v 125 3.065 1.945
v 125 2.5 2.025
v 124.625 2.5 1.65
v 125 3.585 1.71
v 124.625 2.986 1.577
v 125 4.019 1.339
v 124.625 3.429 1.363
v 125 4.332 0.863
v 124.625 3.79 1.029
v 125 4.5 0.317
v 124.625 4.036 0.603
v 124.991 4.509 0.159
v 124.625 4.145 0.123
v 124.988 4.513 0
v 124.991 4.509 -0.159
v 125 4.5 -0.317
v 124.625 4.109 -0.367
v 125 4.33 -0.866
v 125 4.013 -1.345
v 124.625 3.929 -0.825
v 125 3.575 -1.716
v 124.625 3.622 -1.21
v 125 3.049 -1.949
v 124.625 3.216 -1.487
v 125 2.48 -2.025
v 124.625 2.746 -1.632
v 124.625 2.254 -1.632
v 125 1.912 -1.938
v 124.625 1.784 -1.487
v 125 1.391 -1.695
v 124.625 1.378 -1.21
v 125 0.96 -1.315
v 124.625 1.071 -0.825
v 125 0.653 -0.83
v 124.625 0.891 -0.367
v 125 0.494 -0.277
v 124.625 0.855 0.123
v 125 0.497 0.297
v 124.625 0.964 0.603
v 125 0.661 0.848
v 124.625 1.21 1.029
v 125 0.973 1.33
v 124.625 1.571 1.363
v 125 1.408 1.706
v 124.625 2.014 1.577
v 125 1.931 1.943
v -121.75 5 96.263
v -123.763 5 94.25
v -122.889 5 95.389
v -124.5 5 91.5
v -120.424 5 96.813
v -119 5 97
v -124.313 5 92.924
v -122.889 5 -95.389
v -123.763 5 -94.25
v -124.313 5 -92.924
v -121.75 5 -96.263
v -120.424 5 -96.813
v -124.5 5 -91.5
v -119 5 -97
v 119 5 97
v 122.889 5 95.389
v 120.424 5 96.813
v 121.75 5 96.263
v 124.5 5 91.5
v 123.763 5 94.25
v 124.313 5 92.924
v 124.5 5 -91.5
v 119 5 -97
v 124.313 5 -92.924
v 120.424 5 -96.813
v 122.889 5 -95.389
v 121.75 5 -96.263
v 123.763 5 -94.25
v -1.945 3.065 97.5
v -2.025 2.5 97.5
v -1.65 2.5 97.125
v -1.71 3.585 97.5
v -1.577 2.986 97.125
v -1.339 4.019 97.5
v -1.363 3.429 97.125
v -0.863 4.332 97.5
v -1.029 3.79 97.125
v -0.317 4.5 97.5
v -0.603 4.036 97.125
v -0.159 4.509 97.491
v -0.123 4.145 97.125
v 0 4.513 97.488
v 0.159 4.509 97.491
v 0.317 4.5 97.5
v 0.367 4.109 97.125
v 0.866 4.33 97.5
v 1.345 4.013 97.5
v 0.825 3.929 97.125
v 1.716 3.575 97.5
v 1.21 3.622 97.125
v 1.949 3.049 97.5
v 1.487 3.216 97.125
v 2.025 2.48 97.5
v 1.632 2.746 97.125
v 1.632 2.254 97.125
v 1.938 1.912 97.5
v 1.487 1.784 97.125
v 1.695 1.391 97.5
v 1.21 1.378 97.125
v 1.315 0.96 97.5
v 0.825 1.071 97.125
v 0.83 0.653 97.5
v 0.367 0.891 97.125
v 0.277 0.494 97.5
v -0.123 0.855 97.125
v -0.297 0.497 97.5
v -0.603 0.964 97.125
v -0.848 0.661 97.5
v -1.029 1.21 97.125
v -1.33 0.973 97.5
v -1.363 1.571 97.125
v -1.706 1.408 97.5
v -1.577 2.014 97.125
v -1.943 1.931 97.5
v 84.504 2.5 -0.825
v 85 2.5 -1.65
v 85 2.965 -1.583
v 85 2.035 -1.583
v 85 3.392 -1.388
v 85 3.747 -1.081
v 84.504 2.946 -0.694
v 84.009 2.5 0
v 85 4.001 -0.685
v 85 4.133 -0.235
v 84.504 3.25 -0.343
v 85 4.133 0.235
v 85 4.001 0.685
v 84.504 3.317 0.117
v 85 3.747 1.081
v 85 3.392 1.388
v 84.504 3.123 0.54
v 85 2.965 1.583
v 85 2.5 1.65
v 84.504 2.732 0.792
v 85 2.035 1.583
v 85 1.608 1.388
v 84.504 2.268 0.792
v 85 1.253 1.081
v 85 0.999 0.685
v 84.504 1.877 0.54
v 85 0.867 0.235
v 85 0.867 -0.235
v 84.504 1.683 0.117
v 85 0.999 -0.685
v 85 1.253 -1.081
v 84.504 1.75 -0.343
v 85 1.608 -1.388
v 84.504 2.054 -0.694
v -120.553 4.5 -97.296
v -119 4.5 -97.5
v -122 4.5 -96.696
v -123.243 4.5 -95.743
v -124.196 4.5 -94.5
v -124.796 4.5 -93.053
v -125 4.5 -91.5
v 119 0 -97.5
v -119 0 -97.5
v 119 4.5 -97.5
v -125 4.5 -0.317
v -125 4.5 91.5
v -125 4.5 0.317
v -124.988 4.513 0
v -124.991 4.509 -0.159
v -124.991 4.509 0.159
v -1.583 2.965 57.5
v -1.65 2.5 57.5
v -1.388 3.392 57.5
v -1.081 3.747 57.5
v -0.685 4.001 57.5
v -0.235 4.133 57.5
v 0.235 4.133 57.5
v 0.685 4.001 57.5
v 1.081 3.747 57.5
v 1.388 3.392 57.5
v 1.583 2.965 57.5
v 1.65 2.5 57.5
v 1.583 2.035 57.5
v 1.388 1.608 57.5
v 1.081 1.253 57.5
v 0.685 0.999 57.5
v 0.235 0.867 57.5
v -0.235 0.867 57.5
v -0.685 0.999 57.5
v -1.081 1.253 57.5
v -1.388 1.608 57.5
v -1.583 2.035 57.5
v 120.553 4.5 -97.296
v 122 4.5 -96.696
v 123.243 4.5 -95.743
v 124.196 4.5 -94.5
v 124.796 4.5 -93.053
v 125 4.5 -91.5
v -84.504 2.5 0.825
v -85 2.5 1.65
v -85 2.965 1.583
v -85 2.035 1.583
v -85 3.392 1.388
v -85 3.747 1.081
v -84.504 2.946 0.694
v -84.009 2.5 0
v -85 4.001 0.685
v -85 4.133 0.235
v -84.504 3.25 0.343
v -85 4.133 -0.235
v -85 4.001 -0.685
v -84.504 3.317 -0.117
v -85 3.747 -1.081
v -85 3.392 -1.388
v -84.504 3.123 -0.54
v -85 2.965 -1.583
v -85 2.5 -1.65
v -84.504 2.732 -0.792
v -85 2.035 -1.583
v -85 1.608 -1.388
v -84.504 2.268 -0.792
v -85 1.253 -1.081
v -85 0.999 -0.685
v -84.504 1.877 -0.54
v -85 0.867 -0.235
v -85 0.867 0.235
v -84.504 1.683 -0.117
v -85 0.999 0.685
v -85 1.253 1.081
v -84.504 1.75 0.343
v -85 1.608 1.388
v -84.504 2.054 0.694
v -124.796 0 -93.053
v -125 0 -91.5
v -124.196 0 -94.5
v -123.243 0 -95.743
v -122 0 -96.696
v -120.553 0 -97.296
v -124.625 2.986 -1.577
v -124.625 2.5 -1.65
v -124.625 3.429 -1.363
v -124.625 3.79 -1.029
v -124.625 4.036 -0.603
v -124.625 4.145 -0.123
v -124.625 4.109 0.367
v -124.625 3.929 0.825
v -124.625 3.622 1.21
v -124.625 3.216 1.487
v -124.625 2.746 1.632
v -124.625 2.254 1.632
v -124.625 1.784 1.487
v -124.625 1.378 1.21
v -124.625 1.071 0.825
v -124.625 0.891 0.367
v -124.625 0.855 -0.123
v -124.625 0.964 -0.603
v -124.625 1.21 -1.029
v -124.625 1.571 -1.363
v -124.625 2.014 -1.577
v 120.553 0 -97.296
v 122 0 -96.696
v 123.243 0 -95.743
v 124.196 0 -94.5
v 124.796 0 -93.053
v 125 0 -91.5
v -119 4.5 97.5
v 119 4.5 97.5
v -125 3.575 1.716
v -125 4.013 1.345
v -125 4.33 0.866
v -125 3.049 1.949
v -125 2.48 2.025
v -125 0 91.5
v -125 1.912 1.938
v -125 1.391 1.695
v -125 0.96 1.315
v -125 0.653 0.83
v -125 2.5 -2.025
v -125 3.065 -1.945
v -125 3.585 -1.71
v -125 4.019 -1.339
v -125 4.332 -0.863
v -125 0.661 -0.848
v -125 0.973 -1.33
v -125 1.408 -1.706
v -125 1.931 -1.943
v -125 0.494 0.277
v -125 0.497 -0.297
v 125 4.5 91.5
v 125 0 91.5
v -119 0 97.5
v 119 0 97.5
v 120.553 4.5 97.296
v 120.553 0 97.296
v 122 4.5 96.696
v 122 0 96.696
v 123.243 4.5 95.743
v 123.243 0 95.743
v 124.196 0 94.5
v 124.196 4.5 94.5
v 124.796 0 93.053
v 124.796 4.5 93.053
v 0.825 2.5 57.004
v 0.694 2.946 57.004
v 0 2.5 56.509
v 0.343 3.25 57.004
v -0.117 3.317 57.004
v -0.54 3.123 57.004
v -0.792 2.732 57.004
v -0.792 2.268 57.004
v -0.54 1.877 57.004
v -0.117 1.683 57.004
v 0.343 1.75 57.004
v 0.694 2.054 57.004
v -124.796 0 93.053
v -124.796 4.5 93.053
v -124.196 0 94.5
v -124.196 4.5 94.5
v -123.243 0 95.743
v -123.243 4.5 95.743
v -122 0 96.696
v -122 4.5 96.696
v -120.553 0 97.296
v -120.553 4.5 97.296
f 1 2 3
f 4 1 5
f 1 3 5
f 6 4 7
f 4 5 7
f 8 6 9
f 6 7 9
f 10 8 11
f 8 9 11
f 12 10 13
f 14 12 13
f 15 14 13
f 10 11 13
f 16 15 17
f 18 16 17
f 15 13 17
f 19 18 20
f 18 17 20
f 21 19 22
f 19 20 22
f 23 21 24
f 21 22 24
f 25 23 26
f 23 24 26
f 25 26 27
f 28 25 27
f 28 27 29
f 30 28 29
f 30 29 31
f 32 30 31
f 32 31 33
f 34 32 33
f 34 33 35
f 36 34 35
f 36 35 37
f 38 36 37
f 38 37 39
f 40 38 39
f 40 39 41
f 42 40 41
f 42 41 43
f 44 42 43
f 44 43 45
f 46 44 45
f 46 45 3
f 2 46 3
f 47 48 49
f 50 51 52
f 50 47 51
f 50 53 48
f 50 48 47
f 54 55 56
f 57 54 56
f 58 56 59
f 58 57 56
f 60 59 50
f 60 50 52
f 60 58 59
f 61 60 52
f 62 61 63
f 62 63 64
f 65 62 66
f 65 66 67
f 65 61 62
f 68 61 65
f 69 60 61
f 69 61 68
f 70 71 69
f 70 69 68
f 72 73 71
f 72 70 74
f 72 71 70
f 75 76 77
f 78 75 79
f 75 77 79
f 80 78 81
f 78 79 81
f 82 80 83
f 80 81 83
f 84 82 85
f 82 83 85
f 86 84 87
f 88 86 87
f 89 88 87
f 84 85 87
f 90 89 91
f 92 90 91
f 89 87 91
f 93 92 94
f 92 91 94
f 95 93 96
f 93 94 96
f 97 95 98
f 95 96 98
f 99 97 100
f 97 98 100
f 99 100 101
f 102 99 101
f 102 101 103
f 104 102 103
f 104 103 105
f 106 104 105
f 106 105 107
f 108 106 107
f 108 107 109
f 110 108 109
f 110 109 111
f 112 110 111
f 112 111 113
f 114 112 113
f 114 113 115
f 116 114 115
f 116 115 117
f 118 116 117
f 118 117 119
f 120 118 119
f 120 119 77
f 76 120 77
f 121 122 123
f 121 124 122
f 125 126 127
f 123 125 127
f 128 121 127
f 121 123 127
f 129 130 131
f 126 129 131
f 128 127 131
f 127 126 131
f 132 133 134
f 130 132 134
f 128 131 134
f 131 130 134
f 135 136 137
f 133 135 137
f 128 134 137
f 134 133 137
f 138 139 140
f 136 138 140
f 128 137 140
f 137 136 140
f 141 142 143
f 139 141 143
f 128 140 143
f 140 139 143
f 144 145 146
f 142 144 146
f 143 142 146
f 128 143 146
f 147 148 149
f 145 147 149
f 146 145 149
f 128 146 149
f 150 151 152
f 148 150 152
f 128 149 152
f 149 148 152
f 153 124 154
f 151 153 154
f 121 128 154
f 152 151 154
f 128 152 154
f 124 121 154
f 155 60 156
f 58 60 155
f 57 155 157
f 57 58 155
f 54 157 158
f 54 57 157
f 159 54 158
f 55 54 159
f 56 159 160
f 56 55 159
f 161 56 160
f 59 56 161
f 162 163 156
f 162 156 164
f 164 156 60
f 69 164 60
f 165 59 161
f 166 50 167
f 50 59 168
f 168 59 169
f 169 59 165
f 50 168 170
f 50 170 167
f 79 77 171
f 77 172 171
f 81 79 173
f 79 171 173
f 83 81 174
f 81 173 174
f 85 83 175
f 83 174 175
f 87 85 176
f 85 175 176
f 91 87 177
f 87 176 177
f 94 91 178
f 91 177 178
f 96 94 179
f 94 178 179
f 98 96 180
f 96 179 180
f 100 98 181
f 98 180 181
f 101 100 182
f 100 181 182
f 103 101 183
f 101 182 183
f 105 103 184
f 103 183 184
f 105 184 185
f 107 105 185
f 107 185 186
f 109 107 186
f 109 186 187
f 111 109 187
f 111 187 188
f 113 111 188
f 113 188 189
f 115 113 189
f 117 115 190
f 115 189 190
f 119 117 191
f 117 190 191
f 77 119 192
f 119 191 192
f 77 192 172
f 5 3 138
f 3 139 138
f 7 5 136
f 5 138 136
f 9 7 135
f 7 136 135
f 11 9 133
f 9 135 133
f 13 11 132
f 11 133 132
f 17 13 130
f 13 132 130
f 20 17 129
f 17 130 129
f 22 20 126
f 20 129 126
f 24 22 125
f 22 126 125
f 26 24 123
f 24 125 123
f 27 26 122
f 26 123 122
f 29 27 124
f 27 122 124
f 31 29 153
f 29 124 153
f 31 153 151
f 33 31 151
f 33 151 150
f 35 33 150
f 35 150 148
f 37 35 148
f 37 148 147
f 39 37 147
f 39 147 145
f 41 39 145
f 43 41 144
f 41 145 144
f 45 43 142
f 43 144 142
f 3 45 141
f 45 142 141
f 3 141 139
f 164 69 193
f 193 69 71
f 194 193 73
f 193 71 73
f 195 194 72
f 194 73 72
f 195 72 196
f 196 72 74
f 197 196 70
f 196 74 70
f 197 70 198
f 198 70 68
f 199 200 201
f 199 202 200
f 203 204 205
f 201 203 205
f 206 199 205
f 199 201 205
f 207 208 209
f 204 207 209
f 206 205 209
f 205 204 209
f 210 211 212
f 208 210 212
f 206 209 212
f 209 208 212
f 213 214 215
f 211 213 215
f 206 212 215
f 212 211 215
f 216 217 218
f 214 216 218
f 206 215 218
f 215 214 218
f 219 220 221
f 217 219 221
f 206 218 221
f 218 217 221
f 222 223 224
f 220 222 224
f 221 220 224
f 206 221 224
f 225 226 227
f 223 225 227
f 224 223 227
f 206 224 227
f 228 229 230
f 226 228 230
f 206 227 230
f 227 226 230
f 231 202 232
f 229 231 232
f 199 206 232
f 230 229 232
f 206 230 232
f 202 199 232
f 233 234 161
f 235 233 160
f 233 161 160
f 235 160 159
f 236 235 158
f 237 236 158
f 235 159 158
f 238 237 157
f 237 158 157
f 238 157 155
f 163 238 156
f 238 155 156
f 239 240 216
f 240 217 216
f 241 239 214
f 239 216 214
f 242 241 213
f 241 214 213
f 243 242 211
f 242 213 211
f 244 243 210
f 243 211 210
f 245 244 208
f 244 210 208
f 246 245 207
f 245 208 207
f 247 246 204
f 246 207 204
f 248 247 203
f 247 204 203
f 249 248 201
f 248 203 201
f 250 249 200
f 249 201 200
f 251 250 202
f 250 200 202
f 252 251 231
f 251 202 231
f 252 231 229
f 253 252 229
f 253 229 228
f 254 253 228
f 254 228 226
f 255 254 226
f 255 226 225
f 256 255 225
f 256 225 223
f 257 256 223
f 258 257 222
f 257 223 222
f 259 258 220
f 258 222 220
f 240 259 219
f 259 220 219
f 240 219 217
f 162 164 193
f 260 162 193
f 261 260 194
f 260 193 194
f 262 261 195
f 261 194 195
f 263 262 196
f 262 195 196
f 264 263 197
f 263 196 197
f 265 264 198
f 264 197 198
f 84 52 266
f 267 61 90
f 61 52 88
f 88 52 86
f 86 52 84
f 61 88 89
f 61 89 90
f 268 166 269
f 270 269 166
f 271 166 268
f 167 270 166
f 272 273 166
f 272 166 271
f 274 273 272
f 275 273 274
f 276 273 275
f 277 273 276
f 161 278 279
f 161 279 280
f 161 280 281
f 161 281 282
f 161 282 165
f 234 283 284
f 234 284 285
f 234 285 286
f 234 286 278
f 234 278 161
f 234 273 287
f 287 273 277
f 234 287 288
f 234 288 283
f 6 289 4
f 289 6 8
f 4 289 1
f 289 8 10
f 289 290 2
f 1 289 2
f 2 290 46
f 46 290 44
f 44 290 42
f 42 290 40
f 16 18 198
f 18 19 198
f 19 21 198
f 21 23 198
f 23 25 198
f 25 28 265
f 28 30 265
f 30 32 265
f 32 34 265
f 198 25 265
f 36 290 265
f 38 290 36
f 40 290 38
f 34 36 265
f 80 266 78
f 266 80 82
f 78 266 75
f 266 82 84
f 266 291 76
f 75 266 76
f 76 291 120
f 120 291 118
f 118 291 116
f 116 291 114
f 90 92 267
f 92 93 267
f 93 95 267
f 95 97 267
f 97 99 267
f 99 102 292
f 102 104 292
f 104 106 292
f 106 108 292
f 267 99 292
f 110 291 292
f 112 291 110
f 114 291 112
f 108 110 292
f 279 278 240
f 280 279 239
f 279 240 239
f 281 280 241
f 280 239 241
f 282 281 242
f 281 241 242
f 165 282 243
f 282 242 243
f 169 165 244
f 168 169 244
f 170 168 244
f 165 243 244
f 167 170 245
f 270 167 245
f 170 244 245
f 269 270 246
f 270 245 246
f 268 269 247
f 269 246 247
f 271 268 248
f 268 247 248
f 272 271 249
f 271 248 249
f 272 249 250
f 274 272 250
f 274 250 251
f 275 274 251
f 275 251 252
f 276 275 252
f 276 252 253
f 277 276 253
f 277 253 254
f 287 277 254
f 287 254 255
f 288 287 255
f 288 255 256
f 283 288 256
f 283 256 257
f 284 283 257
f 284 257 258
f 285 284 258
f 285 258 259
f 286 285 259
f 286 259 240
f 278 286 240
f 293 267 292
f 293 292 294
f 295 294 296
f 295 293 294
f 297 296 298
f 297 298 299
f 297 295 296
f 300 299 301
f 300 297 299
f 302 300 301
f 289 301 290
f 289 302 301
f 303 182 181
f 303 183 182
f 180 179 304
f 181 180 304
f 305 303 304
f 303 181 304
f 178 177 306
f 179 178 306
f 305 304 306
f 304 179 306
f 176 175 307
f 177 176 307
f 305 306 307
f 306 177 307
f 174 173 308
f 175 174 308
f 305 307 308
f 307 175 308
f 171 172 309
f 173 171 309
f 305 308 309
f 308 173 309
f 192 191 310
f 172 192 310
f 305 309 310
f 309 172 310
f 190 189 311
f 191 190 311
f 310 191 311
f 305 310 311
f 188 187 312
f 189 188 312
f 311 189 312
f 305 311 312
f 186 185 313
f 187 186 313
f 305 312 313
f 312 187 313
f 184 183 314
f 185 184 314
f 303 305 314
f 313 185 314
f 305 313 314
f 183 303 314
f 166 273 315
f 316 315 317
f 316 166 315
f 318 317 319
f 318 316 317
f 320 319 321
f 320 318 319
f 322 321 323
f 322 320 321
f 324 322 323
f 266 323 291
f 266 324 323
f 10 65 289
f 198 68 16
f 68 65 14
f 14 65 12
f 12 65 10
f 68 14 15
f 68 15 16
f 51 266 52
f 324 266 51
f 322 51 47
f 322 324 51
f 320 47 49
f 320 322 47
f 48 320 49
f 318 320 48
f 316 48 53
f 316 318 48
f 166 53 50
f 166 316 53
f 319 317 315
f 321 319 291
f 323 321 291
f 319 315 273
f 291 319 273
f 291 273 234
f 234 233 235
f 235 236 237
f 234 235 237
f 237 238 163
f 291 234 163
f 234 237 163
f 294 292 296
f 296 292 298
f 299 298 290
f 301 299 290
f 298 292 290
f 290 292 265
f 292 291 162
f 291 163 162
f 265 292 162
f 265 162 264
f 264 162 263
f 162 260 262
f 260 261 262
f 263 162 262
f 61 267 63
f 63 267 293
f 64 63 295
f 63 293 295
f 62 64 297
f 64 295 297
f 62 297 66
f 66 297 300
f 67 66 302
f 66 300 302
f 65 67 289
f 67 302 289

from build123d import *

# Parameters (mm, degrees)
SKETCH_1_W                   = 250
SKETCH_1_H                   = 195
EXTRUDE_377_DEPTH            = 5
HOLE_WIZARD_1_M4_D           = 3.3
HOLE_WIZARD_1_M4_DEPTH       = 40
HOLE_WIZARD_1_M4_CSINK_D     = 4.05
HOLE_WIZARD_1_M4_CSINK_ANGLE = 90
HOLE_WIZARD_1_M4_TIP         = 0.991420021
HOLE_WIZARD_2_M4_D           = 3.3
HOLE_WIZARD_2_M4_DEPTH       = 40
HOLE_WIZARD_2_M4_CSINK_D     = 4.05
HOLE_WIZARD_2_M4_CSINK_ANGLE = 90
HOLE_WIZARD_2_M4_TIP         = 0.991420021
HOLE_WIZARD_3_M4_D           = 3.3
HOLE_WIZARD_3_M4_DEPTH       = 40
HOLE_WIZARD_3_M4_CSINK_D     = 4.05
HOLE_WIZARD_3_M4_CSINK_ANGLE = 90
HOLE_WIZARD_3_M4_TIP         = 0.991420021
FILLET_1_R                   = 6
CHAMFER_1_SIZE               = 0.5


with BuildPart() as part:
    # Эскиз1 → Extrude 377 (new body)
    with BuildSketch(Plane(origin=(0, 0, 0), x_dir=(1, 0, 0), z_dir=(0, 1, 0))):
        Rectangle(SKETCH_1_W, SKETCH_1_H)
    extrude(amount=EXTRUDE_377_DEPTH)

    # Резьба-1-M4
    with Locations(Plane(origin=(125, 0, 0), x_dir=(0, 0, -1), z_dir=(1, 0, 0))):
        with Locations((0, 2.5)):
            CounterSinkHole(HOLE_WIZARD_1_M4_D / 2, HOLE_WIZARD_1_M4_CSINK_D / 2, depth=HOLE_WIZARD_1_M4_DEPTH, counter_sink_angle=HOLE_WIZARD_1_M4_CSINK_ANGLE)
            with Locations((0, 0, -(HOLE_WIZARD_1_M4_DEPTH + HOLE_WIZARD_1_M4_TIP / 2))):  # 118° drill point
                Cone(0, HOLE_WIZARD_1_M4_D / 2, HOLE_WIZARD_1_M4_TIP, mode=Mode.SUBTRACT)

    # Резьба-2-M4
    with Locations(Plane.ZY.offset(125)):
        with Locations((0, 2.5)):
            CounterSinkHole(HOLE_WIZARD_2_M4_D / 2, HOLE_WIZARD_2_M4_CSINK_D / 2, depth=HOLE_WIZARD_2_M4_DEPTH, counter_sink_angle=HOLE_WIZARD_2_M4_CSINK_ANGLE)
            with Locations((0, 0, -(HOLE_WIZARD_2_M4_DEPTH + HOLE_WIZARD_2_M4_TIP / 2))):  # 118° drill point
                Cone(0, HOLE_WIZARD_2_M4_D / 2, HOLE_WIZARD_2_M4_TIP, mode=Mode.SUBTRACT)

    # Резьба-3-M4
    with Locations(Plane.XY.offset(97.5)):
        with Locations((0, 2.5)):
            CounterSinkHole(HOLE_WIZARD_3_M4_D / 2, HOLE_WIZARD_3_M4_CSINK_D / 2, depth=HOLE_WIZARD_3_M4_DEPTH, counter_sink_angle=HOLE_WIZARD_3_M4_CSINK_ANGLE)
            with Locations((0, 0, -(HOLE_WIZARD_3_M4_DEPTH + HOLE_WIZARD_3_M4_TIP / 2))):  # 118° drill point
                Cone(0, HOLE_WIZARD_3_M4_D / 2, HOLE_WIZARD_3_M4_TIP, mode=Mode.SUBTRACT)

    # Скругление1
    fillet_1_edges = [part.edges().sort_by_distance(p)[0] for p in [
        (125, 2.5, 97.5),
        (-125, 2.5, 97.5),
        (-125, 2.5, -97.5),
        (125, 2.5, -97.5),
    ]]
    fillet(fillet_1_edges, radius=FILLET_1_R)

    # Фаска1
    # the kernel refuses this chamfer: 0.5 mm, written as the material it takes off along each edge
    with BuildSketch(Plane(origin=(-119, 5, -97.5), x_dir=(0, -0.999621916911297, -0.0274958766105822), z_dir=(1, 0, 0))) as chamfer_1_piece_1:
        Polygon((CHAMFER_1_SIZE * 0.999621916911, -CHAMFER_1_SIZE * 0.0274958766106), (-CHAMFER_1_SIZE * 0.0274958766106, -CHAMFER_1_SIZE * 0.999621916911), (0, 0), align=None)
    extrude(amount=238, mode=Mode.SUBTRACT)
    with BuildSketch(Plane(origin=(125, 5, -91.5), x_dir=(-0.9996219169112968, 0.02749587661058574, 0), z_dir=(0, 0, 1)), Plane(origin=(-125, 5, 91.5), x_dir=(0.9996219169112968, 0.02749587661058574, 0), z_dir=(0, 0, -1))) as chamfer_1_piece_2:
        Polygon((CHAMFER_1_SIZE * 0.999621916911, CHAMFER_1_SIZE * 0.0274958766106), (-CHAMFER_1_SIZE * 0.0274958766106, CHAMFER_1_SIZE * 0.999621916911), (0, 0), align=None)
    extrude(amount=183, mode=Mode.SUBTRACT)
    with BuildSketch(Plane(origin=(119, 5, 97.5), x_dir=(0, 0.02749587661058574, -0.9996219169112968), z_dir=(-1, 0, 0))) as chamfer_1_piece_3:
        Polygon((CHAMFER_1_SIZE * 0.999621916911, CHAMFER_1_SIZE * 0.0274958766106), (-CHAMFER_1_SIZE * 0.0274958766106, CHAMFER_1_SIZE * 0.999621916911), (0, 0), align=None)
    extrude(amount=238, mode=Mode.SUBTRACT)
    with BuildSketch(Plane(origin=(-119, 5, 91.5), x_dir=(0, 0, 1), z_dir=(1, 0, 0))) as chamfer_1_piece_4:
        Polygon((6 - CHAMFER_1_SIZE, 0), (6, CHAMFER_1_SIZE), (6, 0), align=None)
    revolve(axis=Axis((-119, 5, 91.5), (0, -1, 0)), revolution_arc=90, mode=Mode.SUBTRACT)
    with BuildSketch(Plane(origin=(119, 5, 91.5), x_dir=(0, 0, 1), z_dir=(-1, 0, 0))) as chamfer_1_piece_5:
        Polygon((6 - CHAMFER_1_SIZE, 0), (6, -CHAMFER_1_SIZE), (6, 0), align=None)
    revolve(axis=Axis((119, 5, 91.5), (0, 1, 0)), revolution_arc=90, mode=Mode.SUBTRACT)
    with BuildSketch(Plane(origin=(-119, 5, -91.5), x_dir=(0, 0, -1), z_dir=(1, 0, 0))) as chamfer_1_piece_6:
        Polygon((6, -CHAMFER_1_SIZE), (6 - CHAMFER_1_SIZE, 0), (6, 0), align=None)
    revolve(axis=Axis((-119, 5, -91.5), (0, 1, 0)), revolution_arc=90, mode=Mode.SUBTRACT)
    with BuildSketch(Plane(origin=(119, 5, -91.5), x_dir=(0, 0, -1), z_dir=(-1, 0, 0))) as chamfer_1_piece_7:
        Polygon((6, CHAMFER_1_SIZE), (6 - CHAMFER_1_SIZE, 0), (6, 0), align=None)
    revolve(axis=Axis((119, 5, -91.5), (0, -1, 0)), revolution_arc=90, mode=Mode.SUBTRACT)


solid = part.part
